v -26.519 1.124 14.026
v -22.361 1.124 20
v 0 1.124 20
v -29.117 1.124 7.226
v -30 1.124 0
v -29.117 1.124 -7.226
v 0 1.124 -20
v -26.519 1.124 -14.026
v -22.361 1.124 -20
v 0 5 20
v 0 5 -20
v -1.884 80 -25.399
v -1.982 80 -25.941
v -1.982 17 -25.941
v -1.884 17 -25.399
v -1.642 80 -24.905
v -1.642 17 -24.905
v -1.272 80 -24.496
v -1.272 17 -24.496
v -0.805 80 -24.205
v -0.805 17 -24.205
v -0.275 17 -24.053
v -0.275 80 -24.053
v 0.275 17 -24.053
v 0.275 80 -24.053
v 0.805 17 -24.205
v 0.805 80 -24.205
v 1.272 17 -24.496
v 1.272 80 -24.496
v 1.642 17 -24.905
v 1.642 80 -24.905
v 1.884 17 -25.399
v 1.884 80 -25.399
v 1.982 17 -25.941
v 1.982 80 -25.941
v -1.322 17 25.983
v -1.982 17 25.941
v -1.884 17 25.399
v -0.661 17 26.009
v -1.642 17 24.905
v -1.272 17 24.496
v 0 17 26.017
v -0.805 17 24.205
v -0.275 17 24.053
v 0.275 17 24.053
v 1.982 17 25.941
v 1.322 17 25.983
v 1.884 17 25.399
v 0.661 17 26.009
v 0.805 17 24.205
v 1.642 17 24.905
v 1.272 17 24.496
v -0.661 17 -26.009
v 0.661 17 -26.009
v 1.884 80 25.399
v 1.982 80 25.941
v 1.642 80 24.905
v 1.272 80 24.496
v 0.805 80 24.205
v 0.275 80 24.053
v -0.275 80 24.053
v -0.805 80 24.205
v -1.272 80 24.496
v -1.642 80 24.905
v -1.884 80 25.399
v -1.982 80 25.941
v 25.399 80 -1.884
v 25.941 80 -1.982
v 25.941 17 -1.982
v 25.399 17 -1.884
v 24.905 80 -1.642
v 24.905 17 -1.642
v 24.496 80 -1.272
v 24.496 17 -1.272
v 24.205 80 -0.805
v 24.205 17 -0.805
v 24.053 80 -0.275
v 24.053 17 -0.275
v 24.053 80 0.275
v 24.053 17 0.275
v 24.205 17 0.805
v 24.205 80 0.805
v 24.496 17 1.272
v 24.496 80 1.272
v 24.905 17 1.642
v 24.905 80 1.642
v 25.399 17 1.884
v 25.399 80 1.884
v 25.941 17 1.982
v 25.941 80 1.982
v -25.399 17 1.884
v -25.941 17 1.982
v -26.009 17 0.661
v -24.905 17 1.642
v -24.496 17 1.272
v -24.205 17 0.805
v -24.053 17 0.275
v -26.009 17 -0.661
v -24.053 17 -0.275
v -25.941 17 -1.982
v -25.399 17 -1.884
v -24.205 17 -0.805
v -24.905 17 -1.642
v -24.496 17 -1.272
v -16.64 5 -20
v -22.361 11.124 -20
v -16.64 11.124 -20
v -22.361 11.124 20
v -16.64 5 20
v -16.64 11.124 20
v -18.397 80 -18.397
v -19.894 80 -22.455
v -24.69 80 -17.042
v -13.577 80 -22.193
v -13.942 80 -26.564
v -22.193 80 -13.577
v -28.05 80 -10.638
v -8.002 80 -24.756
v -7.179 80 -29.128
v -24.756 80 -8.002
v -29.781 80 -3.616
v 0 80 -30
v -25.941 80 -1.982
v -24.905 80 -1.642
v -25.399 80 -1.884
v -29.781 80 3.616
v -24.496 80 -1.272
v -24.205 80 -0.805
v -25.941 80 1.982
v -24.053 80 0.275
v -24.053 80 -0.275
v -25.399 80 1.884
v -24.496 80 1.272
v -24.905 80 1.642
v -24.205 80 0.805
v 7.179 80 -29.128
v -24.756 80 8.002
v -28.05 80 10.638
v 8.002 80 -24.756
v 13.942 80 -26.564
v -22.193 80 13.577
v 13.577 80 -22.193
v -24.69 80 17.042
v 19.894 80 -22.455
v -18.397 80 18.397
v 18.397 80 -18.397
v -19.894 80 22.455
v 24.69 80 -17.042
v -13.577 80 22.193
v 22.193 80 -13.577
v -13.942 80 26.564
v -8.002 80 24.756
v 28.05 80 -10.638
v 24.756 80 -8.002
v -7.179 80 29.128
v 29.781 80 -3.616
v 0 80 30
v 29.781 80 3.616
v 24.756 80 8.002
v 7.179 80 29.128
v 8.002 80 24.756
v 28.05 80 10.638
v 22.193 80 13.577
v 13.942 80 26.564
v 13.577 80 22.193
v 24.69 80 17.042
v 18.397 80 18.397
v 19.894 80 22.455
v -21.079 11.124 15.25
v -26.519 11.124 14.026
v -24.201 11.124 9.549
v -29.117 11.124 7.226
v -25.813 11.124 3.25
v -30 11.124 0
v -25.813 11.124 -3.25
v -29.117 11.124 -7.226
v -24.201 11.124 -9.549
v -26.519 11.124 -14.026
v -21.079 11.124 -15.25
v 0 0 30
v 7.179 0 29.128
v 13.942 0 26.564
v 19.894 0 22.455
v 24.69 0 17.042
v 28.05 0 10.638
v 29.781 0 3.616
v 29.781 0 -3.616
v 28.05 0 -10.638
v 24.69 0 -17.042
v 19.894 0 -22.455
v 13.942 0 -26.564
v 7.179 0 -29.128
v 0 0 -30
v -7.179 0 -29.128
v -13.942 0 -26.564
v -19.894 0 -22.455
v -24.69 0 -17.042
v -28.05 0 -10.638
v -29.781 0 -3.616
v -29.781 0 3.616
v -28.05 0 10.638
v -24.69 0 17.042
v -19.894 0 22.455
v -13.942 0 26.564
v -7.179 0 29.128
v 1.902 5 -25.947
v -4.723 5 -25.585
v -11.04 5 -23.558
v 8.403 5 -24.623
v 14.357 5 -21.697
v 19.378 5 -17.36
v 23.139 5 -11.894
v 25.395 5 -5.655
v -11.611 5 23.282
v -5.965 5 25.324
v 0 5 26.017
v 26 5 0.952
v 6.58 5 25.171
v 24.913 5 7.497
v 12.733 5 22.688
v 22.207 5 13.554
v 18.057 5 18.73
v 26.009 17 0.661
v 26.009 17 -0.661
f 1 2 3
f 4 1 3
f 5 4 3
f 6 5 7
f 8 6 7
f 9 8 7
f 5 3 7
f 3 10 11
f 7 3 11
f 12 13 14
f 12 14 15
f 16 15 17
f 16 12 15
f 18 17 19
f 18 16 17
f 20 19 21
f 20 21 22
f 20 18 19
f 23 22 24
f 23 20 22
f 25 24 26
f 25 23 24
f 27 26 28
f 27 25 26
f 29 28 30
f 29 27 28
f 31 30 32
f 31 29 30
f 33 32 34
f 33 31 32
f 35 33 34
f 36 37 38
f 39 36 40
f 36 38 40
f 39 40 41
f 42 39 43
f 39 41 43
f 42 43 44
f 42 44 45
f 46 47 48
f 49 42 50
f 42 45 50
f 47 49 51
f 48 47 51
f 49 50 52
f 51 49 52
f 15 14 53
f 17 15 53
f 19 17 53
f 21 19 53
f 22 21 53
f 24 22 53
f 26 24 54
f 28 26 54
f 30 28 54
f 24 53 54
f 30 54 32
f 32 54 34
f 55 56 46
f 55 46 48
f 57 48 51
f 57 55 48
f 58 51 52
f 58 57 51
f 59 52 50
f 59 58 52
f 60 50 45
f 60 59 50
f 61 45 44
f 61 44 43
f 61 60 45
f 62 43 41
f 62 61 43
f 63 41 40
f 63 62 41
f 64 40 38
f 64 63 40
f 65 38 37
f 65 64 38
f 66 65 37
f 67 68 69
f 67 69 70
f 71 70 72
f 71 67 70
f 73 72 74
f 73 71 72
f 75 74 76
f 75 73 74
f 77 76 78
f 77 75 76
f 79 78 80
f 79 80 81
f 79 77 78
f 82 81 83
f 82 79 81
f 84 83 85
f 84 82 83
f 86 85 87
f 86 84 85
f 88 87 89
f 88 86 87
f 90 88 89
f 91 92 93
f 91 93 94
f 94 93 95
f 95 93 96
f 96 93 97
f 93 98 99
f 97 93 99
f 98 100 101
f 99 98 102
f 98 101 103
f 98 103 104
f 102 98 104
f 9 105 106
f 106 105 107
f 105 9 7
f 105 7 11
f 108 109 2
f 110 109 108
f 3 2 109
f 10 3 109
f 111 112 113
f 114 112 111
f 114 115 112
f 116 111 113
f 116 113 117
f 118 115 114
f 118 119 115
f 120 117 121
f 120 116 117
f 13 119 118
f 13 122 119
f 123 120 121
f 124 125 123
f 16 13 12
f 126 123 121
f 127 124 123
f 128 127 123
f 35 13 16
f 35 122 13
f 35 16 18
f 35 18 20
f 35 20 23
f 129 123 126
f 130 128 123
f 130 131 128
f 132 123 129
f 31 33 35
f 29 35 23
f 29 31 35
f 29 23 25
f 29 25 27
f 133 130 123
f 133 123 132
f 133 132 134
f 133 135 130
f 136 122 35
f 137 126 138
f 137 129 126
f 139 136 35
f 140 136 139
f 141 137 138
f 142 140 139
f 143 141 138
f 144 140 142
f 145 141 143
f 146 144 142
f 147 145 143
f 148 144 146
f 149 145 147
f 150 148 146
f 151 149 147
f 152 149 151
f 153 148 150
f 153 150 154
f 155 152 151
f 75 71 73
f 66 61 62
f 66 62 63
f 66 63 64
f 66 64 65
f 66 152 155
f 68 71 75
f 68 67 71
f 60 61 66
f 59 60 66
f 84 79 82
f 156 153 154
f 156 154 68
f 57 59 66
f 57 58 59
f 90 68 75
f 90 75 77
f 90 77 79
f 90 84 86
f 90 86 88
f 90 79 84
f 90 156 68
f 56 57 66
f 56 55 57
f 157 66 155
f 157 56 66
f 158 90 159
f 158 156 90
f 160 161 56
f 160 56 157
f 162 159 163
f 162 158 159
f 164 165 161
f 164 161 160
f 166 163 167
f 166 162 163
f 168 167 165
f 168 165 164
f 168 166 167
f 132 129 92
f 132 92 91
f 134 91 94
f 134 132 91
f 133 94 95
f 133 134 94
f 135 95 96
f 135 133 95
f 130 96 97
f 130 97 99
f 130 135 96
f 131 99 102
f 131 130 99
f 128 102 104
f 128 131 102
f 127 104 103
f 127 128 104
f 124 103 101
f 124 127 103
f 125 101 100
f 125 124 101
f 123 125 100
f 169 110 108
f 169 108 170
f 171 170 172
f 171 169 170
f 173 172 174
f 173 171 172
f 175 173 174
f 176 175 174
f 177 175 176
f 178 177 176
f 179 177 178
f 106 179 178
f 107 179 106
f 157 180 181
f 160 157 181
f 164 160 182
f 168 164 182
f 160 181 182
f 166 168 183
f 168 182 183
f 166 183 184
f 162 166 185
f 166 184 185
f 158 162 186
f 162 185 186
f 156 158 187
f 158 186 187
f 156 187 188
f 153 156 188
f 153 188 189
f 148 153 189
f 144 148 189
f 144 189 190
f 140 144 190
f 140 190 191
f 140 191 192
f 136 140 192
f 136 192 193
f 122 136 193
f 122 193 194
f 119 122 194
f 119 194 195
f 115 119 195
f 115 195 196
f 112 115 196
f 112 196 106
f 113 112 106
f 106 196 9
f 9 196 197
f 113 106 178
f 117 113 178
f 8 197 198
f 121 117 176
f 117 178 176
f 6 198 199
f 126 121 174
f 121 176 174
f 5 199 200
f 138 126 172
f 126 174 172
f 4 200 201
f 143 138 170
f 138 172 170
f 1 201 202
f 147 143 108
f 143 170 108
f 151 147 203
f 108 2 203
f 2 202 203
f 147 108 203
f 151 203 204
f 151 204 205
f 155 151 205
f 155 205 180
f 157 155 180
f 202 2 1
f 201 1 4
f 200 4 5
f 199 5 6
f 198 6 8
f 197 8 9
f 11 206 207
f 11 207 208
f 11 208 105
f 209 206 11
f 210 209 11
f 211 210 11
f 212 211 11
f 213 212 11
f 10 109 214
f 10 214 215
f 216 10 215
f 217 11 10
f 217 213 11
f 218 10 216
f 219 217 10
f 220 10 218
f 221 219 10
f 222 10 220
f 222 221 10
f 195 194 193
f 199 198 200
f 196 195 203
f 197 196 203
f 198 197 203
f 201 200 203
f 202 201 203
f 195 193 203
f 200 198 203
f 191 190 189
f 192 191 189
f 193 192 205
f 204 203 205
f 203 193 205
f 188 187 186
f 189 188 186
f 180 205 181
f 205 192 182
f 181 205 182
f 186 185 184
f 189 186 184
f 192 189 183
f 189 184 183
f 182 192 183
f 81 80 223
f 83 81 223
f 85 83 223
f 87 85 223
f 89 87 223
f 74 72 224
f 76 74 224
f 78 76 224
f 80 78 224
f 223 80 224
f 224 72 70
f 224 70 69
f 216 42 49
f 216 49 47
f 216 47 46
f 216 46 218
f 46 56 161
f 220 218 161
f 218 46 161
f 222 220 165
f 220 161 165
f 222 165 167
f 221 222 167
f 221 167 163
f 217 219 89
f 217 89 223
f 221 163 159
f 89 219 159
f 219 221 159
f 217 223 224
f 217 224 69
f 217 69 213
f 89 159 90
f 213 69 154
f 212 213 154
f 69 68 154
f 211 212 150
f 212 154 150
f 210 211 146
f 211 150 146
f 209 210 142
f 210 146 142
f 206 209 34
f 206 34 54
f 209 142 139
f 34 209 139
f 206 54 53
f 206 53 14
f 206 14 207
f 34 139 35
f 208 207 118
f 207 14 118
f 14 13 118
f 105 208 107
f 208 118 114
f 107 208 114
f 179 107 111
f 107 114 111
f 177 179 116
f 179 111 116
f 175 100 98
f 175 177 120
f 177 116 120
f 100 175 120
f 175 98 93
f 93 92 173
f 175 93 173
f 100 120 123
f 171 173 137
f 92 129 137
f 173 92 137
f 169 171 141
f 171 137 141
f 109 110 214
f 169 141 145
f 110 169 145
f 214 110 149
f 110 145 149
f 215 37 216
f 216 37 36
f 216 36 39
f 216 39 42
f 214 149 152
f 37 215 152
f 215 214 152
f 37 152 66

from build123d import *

# Parameters (mm, degrees)
SKETCH2_R           = 30
BOSS_EXTRUDE1_DEPTH = 80
SKETCH3_R           = 26.016919331
CUT_EXTRUDE4_DEPTH  = 75
SKETCH5_W           = 40
SKETCH5_H           = 10
CUT_EXTRUDE6_DEPTH  = 91.553851381
SKETCH6_R           = 1.983080669
BOSS_EXTRUDE2_DEPTH = 63


with BuildPart() as part:
    # Sketch2 → Boss-Extrude1 (new body)
    with BuildSketch(Plane(origin=(0, 0, 0), x_dir=(1, 0, 0), z_dir=(0, 1, 0))):
        with Locations(Location((0, 0, 0), (0, 0, 270))):
            Circle(SKETCH2_R)
    extrude(amount=BOSS_EXTRUDE1_DEPTH)

    # Sketch3 → Cut-Extrude4 (cut)
    with BuildSketch(Plane(origin=(0, 80, 0), x_dir=(1, 0, 0), z_dir=(0, 1, 0))):
        with Locations(Location((0, 0, 0), (0, 0, 270))):
            Circle(SKETCH3_R)
    extrude(amount=-CUT_EXTRUDE4_DEPTH, mode=Mode.SUBTRACT)

    # Sketch5 → Cut-Extrude6 (cut, through all)
    with BuildSketch(Plane(origin=(0, 0, 0), x_dir=(0, 0, -1), z_dir=(1, 0, 0))):
        with Locations((0, 6.124342534)):
            Rectangle(SKETCH5_W, SKETCH5_H)
    extrude(amount=-CUT_EXTRUDE6_DEPTH, mode=Mode.SUBTRACT)

    # Sketch6 → Boss-Extrude2 (add)
    with BuildSketch(Plane(origin=(0, 80, 0), x_dir=(1, 0, 0), z_dir=(0, 1, 0))):
        with Locations((26.016919331, 0)):
            Circle(SKETCH6_R)
        with Locations((-26.016919331, 0)):
            Circle(SKETCH6_R)
        with Locations((0, -26.016919331)):
            Circle(SKETCH6_R)
        with Locations((0, 26.016919331)):
            Circle(SKETCH6_R)
    extrude(amount=-BOSS_EXTRUDE2_DEPTH)


solid = part.part
